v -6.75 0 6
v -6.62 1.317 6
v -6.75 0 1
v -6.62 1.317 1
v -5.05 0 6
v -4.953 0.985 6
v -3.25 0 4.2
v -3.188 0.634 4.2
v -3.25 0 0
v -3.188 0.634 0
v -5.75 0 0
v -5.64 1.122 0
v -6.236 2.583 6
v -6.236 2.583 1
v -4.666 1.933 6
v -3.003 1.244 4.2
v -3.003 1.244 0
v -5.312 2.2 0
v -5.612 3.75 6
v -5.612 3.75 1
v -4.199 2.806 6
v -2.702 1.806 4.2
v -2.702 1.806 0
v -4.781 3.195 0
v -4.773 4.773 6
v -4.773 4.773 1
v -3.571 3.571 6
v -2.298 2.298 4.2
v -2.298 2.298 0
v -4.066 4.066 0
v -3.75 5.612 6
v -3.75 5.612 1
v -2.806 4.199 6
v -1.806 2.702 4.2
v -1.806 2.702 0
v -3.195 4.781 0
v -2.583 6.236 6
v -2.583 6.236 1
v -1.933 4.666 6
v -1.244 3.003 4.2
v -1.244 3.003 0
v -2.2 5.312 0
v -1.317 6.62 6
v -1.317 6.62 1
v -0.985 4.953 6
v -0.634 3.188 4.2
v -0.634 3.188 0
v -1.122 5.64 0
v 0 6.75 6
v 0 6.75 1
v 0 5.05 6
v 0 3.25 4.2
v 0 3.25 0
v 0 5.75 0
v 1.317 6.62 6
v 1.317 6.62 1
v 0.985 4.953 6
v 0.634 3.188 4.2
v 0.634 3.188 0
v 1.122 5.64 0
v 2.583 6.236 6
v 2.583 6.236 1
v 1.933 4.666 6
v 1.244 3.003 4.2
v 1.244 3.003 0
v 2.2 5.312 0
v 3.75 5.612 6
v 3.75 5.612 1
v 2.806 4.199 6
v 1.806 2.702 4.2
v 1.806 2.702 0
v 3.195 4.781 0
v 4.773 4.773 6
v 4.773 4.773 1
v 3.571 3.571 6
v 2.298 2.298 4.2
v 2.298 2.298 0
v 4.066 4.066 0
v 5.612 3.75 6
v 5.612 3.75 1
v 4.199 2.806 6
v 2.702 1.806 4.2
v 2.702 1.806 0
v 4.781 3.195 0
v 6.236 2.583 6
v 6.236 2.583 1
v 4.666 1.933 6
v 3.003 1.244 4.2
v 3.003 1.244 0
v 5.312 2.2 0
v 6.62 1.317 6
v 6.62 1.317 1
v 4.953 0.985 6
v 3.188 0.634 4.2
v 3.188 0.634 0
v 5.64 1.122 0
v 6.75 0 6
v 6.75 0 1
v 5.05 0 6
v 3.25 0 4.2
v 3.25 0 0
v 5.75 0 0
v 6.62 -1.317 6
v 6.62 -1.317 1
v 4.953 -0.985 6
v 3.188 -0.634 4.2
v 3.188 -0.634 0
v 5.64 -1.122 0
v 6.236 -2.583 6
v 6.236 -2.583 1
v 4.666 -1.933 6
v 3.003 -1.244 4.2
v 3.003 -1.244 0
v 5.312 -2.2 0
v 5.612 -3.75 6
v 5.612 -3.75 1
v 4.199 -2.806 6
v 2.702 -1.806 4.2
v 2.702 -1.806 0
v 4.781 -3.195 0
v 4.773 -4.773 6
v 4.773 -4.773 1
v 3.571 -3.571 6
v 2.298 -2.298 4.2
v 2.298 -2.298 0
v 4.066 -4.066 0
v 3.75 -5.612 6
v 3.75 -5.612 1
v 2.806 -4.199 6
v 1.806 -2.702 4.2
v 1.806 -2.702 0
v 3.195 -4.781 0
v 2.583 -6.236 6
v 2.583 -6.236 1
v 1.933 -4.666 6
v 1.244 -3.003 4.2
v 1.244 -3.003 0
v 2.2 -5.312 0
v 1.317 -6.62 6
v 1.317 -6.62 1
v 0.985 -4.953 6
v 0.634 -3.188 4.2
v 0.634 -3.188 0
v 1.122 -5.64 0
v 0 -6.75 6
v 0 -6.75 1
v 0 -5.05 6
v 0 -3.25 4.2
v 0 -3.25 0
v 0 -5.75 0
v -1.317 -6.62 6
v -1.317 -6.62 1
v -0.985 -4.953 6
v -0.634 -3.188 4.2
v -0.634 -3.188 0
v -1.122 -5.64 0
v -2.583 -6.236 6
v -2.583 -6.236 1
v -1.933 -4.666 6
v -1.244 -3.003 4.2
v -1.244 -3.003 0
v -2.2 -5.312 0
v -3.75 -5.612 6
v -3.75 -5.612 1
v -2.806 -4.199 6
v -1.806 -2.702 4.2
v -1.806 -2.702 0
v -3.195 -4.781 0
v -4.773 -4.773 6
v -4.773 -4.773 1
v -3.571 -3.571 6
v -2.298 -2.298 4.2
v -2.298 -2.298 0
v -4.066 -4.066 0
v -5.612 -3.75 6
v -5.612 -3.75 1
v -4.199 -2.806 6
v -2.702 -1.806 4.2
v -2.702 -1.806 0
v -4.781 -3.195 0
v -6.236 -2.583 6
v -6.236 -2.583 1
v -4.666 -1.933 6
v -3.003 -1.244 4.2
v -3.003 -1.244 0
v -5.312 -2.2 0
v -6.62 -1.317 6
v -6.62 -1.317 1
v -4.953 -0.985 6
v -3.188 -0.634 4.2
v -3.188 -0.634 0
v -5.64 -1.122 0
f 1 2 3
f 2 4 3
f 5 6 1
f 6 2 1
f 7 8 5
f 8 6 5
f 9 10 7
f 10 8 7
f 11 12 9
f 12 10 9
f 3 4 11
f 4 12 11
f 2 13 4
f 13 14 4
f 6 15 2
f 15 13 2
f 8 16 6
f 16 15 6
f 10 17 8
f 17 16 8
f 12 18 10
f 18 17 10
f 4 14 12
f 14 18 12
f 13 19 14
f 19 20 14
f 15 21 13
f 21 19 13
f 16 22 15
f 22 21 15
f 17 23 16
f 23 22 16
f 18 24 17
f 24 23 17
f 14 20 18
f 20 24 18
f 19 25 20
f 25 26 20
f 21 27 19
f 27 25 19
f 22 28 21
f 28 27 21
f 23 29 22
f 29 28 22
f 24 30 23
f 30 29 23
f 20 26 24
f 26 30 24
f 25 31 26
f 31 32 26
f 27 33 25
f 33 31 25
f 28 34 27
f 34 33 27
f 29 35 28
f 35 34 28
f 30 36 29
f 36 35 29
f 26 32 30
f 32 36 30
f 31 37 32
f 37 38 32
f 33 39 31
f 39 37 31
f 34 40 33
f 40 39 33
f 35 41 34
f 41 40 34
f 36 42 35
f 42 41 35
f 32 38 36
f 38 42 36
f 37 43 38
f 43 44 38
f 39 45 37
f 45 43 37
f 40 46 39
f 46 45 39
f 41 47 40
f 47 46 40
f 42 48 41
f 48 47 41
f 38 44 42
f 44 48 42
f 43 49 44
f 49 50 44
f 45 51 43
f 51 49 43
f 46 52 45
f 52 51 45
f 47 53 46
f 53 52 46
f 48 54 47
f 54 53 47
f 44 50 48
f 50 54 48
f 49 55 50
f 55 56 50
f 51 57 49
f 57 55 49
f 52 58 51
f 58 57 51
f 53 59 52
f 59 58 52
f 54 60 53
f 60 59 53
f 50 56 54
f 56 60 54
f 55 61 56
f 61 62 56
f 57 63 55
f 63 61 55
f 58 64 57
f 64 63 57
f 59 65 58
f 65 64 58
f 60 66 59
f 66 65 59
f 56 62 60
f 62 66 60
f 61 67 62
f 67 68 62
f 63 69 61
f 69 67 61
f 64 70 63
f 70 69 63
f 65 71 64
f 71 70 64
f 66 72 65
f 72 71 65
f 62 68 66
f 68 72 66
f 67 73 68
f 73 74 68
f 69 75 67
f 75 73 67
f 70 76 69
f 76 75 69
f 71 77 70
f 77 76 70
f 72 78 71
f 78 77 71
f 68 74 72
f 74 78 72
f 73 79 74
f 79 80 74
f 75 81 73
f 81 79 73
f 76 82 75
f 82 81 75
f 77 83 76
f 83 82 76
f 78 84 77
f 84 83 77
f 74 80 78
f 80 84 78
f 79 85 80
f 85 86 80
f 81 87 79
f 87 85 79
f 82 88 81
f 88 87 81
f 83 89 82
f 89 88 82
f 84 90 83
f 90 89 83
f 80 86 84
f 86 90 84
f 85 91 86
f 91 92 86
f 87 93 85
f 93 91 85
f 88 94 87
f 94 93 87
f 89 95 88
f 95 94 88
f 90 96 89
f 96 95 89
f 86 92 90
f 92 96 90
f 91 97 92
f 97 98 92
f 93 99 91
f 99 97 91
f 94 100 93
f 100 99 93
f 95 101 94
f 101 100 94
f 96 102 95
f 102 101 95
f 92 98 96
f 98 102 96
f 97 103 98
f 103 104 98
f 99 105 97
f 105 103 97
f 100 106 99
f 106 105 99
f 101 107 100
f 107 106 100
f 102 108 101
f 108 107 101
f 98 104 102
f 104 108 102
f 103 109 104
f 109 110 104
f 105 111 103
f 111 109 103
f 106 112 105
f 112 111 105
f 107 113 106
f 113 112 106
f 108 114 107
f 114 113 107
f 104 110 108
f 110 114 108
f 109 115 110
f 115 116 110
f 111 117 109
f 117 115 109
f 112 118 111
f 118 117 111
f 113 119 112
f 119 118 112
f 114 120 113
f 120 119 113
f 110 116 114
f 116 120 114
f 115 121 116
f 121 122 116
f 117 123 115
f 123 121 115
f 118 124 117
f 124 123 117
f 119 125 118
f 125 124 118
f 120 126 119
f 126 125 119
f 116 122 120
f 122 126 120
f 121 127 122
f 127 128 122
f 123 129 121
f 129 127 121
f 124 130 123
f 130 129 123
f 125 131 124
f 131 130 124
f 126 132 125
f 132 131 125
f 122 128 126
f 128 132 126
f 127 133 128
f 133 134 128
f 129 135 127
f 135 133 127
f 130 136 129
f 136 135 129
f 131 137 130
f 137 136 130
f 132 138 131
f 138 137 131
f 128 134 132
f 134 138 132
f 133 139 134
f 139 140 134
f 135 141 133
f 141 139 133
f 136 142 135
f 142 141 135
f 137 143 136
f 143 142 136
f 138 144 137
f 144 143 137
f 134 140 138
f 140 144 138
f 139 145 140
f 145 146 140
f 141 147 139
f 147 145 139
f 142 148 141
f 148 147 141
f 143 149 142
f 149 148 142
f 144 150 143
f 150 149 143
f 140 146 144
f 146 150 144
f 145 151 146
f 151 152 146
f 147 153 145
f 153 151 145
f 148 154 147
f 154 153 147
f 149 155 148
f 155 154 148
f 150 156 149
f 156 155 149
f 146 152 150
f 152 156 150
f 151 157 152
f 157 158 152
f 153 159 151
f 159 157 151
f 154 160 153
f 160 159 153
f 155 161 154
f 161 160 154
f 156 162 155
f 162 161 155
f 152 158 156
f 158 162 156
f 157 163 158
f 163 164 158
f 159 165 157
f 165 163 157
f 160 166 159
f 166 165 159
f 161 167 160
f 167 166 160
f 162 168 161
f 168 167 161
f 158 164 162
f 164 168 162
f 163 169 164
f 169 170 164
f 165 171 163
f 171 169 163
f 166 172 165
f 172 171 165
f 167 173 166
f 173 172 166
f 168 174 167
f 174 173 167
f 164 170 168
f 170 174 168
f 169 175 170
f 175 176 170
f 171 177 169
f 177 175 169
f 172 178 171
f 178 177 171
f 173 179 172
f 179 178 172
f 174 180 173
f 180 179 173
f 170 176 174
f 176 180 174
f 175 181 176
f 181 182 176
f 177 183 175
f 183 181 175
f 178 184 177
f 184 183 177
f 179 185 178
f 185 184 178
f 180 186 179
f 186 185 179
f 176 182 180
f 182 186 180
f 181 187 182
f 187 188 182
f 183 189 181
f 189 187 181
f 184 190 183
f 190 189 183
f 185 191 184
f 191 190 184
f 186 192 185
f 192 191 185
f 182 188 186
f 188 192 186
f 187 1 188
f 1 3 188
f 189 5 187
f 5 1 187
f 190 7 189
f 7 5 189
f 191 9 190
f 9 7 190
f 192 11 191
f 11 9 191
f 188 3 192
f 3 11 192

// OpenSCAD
$fn = 32;

// ----------------------------------------------------------------------
// Form washer: countersunk washer, 13.5 mm outside, 6.5 mm bore
// ----------------------------------------------------------------------

// --- parameters (mm) ---
revolve_angle = 360;      // full turn around the Z axis
profile_points = 6;       // points of the closed outline

profile = [[3.25, 0], [5.75, 0], [6.75, 1], [6.75, 6], [5.05, 6], [3.25, 4.2]];  // single closed polygon, 6 points, counter clockwise

// --- the one profile operation ---
rotate_extrude(angle = revolve_angle) polygon(points = profile);
